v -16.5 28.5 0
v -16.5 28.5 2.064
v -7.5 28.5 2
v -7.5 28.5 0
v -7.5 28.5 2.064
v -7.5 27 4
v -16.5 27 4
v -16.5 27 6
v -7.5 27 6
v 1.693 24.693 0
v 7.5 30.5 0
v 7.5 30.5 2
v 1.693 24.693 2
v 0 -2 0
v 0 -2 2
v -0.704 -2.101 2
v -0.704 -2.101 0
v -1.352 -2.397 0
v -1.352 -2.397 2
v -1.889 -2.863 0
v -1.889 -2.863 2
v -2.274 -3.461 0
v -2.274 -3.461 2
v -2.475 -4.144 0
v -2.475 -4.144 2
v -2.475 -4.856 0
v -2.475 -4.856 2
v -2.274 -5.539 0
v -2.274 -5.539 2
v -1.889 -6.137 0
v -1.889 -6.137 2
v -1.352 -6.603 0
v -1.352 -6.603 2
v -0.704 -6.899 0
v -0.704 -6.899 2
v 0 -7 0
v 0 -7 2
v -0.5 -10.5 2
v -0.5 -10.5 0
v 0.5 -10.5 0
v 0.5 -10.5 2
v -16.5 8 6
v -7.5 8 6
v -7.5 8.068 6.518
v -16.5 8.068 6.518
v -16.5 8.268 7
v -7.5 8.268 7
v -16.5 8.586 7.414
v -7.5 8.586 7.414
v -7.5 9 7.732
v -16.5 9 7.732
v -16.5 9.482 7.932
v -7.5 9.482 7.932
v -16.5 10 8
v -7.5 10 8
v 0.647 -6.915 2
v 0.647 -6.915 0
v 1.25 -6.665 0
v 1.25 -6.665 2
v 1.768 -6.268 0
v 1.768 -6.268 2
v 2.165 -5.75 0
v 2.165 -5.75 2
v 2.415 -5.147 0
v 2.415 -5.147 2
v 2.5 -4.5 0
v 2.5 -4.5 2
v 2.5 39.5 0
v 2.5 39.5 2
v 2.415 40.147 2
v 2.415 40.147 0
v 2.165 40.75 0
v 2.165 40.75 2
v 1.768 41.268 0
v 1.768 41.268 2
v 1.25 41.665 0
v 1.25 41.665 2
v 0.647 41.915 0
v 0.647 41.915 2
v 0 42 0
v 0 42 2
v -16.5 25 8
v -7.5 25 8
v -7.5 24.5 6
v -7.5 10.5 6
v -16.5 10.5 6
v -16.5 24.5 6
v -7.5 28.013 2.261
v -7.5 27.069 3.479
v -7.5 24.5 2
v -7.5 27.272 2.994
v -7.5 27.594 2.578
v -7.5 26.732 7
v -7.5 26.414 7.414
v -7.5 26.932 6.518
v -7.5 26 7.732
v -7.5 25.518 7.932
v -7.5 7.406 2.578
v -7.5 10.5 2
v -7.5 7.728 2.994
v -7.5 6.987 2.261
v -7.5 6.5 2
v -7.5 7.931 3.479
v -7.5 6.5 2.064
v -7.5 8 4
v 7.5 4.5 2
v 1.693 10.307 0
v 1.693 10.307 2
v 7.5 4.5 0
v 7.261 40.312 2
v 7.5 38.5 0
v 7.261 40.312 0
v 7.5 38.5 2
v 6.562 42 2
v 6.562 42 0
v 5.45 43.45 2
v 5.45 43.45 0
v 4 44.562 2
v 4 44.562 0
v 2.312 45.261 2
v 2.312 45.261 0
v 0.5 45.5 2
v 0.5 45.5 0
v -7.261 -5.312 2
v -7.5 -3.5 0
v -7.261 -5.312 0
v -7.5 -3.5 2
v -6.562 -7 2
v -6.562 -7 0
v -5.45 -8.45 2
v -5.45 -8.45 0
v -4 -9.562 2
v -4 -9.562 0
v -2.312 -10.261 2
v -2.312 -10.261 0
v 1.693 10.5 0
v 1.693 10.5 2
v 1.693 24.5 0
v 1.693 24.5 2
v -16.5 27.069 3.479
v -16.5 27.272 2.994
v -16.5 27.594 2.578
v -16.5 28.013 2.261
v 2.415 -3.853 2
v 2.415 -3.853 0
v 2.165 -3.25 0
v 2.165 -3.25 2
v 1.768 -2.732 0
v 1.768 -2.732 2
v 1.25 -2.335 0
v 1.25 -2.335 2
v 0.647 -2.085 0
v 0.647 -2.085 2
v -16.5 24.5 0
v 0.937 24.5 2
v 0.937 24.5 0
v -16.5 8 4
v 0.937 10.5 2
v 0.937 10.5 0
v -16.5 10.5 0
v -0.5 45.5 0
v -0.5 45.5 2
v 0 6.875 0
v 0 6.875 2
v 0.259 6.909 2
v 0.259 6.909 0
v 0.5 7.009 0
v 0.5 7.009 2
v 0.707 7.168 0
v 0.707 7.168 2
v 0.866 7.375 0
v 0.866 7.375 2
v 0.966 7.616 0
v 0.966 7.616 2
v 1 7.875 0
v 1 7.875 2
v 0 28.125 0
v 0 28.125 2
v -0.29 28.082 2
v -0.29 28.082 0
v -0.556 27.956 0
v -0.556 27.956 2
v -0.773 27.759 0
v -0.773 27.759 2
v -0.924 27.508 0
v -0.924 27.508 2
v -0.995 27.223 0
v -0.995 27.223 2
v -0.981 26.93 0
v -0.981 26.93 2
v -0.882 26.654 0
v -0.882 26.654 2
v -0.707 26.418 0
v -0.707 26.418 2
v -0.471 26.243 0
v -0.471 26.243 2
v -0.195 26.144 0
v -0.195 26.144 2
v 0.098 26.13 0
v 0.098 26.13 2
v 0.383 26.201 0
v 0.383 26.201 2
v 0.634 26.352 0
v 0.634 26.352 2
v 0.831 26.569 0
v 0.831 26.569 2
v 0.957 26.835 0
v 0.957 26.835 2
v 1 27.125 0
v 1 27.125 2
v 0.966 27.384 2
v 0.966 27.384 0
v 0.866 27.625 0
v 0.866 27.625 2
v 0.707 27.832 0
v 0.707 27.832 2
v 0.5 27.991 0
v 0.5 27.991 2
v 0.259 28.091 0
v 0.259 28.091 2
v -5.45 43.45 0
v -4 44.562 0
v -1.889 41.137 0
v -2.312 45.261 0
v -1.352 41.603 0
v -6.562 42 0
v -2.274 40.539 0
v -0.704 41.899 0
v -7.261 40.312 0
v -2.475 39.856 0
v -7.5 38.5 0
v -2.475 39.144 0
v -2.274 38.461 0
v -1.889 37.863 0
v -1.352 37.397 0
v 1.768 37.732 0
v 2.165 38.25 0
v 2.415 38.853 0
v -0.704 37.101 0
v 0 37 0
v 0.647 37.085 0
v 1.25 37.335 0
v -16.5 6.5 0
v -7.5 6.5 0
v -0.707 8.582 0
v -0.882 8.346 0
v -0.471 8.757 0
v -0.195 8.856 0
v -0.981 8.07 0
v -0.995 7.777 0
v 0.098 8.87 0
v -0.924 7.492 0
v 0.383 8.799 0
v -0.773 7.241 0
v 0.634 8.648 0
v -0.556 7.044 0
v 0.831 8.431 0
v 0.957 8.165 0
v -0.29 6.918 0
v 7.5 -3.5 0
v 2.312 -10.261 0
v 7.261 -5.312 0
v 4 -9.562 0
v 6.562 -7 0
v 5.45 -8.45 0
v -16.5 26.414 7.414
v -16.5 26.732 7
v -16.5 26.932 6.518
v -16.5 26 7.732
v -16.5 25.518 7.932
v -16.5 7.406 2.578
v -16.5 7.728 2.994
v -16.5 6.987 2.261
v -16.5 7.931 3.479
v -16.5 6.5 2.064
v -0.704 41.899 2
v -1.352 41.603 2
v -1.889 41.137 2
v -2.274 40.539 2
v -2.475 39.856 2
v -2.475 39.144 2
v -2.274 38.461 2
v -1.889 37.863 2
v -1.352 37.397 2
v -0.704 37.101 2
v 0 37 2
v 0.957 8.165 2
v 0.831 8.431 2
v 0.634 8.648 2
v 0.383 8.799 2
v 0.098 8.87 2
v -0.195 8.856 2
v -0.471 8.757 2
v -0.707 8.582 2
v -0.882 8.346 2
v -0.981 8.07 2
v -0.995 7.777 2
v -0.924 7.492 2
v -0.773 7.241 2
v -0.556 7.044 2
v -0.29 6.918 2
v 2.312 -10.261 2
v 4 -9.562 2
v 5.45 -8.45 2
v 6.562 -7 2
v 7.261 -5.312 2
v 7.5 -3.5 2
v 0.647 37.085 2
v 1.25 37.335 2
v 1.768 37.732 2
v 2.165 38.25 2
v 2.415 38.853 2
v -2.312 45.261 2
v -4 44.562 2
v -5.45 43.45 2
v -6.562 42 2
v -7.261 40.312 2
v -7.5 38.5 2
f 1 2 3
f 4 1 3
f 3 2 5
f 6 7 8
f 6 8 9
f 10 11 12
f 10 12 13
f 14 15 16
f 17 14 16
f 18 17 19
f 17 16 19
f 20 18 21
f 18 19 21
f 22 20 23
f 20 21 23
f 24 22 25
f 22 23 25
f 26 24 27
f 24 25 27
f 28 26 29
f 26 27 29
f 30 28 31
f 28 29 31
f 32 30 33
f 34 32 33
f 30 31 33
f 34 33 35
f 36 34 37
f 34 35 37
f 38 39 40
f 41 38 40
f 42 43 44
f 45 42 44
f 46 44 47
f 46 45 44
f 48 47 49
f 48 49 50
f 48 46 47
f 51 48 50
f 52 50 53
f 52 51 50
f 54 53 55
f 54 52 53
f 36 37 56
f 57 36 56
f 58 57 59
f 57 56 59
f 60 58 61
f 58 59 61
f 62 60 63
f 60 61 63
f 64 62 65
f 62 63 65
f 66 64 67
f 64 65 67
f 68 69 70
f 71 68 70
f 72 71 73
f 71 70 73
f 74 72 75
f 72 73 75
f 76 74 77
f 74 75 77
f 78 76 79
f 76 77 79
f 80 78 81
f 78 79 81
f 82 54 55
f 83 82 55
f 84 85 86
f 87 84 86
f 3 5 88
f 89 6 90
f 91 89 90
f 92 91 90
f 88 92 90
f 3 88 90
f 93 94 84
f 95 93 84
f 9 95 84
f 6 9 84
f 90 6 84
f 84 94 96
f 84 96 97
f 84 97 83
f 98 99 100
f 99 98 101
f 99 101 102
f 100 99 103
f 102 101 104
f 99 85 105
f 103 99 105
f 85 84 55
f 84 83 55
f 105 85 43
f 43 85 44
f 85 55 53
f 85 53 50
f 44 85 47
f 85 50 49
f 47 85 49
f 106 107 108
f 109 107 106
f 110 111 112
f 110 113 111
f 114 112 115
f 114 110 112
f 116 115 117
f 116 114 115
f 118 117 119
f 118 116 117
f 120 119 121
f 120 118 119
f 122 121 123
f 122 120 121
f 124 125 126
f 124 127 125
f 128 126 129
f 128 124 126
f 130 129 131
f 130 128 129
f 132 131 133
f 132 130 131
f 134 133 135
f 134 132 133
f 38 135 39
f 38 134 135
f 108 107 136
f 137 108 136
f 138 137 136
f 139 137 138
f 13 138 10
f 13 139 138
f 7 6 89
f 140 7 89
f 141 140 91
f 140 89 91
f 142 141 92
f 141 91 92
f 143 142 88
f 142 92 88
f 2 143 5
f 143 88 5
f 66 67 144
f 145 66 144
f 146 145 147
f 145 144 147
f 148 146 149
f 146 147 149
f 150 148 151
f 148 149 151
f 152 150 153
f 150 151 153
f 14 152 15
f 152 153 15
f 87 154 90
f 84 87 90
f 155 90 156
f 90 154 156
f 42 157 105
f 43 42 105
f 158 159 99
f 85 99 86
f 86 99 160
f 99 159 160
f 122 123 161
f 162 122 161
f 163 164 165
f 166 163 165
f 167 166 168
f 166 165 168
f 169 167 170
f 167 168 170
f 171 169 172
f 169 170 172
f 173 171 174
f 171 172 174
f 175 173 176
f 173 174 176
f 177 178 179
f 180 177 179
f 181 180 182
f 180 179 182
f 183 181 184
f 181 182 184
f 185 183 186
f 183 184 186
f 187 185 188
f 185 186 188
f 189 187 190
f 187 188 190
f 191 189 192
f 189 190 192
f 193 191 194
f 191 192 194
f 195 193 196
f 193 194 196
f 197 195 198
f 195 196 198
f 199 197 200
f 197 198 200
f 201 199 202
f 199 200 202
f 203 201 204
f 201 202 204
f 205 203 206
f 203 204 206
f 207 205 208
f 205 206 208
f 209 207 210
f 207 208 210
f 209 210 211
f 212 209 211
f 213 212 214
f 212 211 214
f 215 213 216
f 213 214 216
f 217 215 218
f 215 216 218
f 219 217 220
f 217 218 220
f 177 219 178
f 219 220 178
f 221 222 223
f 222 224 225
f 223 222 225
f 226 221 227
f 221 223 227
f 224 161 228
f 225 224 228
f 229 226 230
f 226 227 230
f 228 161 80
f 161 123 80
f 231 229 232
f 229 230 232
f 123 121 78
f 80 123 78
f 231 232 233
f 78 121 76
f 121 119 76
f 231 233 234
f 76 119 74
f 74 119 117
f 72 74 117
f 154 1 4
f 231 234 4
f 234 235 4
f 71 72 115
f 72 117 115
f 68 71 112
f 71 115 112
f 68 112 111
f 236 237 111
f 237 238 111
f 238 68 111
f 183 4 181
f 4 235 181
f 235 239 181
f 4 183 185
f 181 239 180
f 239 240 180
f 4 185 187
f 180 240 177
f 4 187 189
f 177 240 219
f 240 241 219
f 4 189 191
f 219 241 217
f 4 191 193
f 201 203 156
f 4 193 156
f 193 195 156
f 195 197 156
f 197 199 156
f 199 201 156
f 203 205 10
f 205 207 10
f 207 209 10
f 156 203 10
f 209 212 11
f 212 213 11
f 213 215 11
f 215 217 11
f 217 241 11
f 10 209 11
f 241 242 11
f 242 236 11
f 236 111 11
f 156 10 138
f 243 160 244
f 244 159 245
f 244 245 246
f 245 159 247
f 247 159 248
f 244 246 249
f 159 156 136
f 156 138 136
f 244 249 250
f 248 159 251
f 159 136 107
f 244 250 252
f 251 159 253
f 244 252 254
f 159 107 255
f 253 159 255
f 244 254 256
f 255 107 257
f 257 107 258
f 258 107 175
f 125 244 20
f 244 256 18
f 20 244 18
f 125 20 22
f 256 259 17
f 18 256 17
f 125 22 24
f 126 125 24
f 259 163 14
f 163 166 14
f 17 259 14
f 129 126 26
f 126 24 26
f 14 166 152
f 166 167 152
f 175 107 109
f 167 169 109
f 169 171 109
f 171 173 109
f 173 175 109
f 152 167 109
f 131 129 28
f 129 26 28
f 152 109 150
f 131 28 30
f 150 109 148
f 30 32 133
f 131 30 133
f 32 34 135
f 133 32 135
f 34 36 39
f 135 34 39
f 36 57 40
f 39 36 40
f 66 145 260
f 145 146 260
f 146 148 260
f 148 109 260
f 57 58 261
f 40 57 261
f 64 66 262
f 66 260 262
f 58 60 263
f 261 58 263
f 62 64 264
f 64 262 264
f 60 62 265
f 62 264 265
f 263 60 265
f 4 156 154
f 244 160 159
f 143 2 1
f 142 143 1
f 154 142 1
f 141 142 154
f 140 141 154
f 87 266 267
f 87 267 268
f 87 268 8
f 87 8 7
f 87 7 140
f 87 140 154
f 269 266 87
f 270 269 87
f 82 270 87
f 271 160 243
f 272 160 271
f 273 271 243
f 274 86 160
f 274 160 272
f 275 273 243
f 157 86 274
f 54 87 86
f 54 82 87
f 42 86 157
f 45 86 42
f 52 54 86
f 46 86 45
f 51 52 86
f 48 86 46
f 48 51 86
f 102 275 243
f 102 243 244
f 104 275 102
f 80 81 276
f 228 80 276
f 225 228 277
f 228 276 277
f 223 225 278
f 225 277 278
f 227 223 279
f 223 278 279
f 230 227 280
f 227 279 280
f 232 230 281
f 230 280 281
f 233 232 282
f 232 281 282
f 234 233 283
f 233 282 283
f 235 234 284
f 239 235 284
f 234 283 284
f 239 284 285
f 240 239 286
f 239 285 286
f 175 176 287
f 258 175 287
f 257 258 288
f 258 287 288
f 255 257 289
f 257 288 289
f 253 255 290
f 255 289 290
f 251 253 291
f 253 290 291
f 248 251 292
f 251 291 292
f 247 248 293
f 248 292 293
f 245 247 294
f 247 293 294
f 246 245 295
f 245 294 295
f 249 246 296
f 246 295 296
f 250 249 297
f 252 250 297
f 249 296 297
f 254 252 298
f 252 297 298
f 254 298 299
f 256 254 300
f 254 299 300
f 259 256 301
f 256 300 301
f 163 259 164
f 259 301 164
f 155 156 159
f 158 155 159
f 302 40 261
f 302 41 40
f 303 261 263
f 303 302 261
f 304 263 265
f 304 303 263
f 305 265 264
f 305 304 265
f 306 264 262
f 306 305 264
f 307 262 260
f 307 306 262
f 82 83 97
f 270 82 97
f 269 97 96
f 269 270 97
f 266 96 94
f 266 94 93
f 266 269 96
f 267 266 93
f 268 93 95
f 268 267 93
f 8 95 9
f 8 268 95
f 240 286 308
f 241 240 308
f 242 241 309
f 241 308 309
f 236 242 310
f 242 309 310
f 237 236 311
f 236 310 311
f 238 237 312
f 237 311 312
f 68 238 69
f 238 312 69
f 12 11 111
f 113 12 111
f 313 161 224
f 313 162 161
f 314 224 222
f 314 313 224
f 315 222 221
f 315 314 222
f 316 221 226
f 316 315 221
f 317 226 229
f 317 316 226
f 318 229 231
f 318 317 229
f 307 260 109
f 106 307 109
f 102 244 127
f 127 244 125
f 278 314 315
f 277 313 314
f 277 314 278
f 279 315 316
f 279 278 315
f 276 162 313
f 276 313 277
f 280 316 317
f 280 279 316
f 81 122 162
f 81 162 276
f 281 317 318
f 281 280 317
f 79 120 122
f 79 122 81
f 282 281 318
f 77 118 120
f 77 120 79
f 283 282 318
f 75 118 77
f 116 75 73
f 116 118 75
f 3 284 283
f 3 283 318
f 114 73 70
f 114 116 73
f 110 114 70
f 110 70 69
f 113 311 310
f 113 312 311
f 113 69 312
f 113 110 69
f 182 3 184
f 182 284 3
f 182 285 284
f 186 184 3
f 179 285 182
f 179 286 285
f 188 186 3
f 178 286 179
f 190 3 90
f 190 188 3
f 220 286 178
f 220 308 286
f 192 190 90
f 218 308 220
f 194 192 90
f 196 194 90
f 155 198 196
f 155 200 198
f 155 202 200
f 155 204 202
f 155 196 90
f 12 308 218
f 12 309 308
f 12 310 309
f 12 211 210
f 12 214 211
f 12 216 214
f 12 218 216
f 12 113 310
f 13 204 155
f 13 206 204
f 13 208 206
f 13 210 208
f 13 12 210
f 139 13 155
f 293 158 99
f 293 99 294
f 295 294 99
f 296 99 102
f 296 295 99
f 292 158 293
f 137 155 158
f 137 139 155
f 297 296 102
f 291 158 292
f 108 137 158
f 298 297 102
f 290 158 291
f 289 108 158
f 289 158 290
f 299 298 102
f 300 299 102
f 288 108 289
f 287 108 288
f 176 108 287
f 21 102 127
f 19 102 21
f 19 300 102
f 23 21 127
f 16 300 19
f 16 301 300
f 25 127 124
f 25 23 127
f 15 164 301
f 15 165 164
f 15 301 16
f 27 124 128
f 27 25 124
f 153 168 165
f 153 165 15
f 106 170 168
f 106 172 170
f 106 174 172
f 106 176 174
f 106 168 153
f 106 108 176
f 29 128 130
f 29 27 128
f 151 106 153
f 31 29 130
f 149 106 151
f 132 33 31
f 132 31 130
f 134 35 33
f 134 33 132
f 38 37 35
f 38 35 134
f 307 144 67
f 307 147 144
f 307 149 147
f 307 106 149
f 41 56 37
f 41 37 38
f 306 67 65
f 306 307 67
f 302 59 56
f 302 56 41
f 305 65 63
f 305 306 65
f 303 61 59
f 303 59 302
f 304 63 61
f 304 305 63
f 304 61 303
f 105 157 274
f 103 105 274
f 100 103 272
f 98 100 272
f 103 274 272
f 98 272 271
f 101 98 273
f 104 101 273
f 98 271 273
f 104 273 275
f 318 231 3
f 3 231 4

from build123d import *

# Parameters (mm, degrees)
F0_W          = 0.7558596553
F0_H          = 7
F1_DEPTH      = 2
F2_R          = 7
F4_DEPTH      = 2
F5_W          = 4
F5_H          = 2
F6_DEPTH      = 9
F8_DEPTH      = 6
F9_W          = 9
F9_H          = 2
F10_DEPTH     = 14
F11_W         = 4
F11_H         = 2
F12_DEPTH     = 9
F13_W         = 9
F13_H         = 2.5
F14_DEPTH     = 6
F15_T4_DEPTH  = 32.8601958556
F15_T9_DEPTH  = 32.8601958556
F16_T4_DEPTH  = 9
F16_T9_DEPTH  = 9
F16_T11_DEPTH = 19


# Not quite as in the source:
# - a fillet or chamfer that OpenCascade refuses, or shapes differently, is made with other operations: its cross-section is extruded or revolved along the edge and cut away or added
# - a feature names something its author has since deleted; it is built from what else it names


with BuildPart() as f1:
    # F0 (on Top) → F1 (new body)
    with BuildSketch(Plane.XY):
        Polygon((-2.7234070003, 10.5), (-7.5, 10.5), (-7.5, -10.5), (7.5, -10.5), (7.5, 10.5), (1.692557591, 10.5), (0.9366979357, 10.5), (-1.7226199852, 10.5), (-2.5201837998, 10.5), align=None)
        with Locations((1.3146277633, 14)):
            Rectangle(F0_W, F0_H)
        with Locations((1.3146277633, 21)):
            Rectangle(F0_W, F0_H)
        Polygon((-1.7226199852, 24.5), (0.9366979357, 24.5), (1.692557591, 24.5), (7.5, 24.5), (7.5, 45.5), (-7.5, 45.5), (-7.5, 24.5), (-2.7234070003, 24.5), (-2.5201837998, 24.5), align=None)
    extrude(amount=F1_DEPTH)

    # F2
    f2_edges = [f1.edges().sort_by_distance(p)[0] for p in [
        (-7.5, -10.5, 1),
        (7.5, -10.5, 1),
        (7.5, 45.5, 1),
        (-7.5, 45.5, 1),
    ]]
    fillet(f2_edges, radius=F2_R)

    # F3 (on face) → F4 (cut, through all)
    with BuildSketch(Plane.XY.offset(2)):
        with BuildLine():
            ThreePointArc((0, -7), (1.767766953, -6.267766953), (2.5, -4.5))
            ThreePointArc((2.5, -4.5), (1.767766953, -2.732233047), (0, -2))
            Line((0, -2), (0, -4.5))
            Line((0, -4.5), (0, -7))
        make_face()
        with BuildLine():
            ThreePointArc((1, 7.875), (-0.7071067812, 8.5821067812), (0, 6.875))
            ThreePointArc((0, 6.875), (0.7071067812, 7.1678932188), (1, 7.875))
        make_face()
        with BuildLine():
            Line((0, -4.5), (0, -2))
            ThreePointArc((0, -2), (-2.5, -4.5), (0, -7))
            Line((0, -7), (0, -4.5))
        make_face()
        with BuildLine():
            ThreePointArc((2.5, 39.5), (1.767766953, 41.267766953), (0, 42))
            Line((0, 42), (0, 39.5))
            Line((0, 39.5), (0, 37))
            ThreePointArc((0, 37), (1.767766953, 37.732233047), (2.5, 39.5))
        make_face()
        with BuildLine():
            ThreePointArc((1, 27.125), (0.7071067812, 27.8321067812), (0, 28.125))
            ThreePointArc((0, 28.125), (-0.7071067812, 26.4178932188), (1, 27.125))
        make_face()
        with BuildLine():
            Line((0, 39.5), (0, 42))
            ThreePointArc((0, 42), (-2.5, 39.5), (0, 37))
            Line((0, 37), (0, 39.5))
        make_face()
    extrude(amount=-F4_DEPTH, mode=Mode.SUBTRACT)

    # F5 (on face) → F6 (join)
    with BuildSketch(Plane(origin=(-7.5, 0, 0), x_dir=(0, -1, 0), z_dir=(-1, 0, 0))):
        with Locations((-8.5, 1)):
            Rectangle(F5_W, F5_H)
    extrude(amount=F6_DEPTH)

    # F7 (on face) → F8 (join)
    with BuildSketch(Plane.XY.offset(2)):
        Polygon((-8.0660292879, 10.5), (-16.5, 10.5), (-16.5, 8), (-7.5, 8), (-7.5, 10.5), align=None)
    extrude(amount=F8_DEPTH)

    # F9 (on face) → F10 (join)
    with BuildSketch(Plane(origin=(0, 10.5, 0), x_dir=(-1, 0, 0), z_dir=(0, 1, 0))):
        with Locations((12, 7)):
            Rectangle(F9_W, F9_H)
    extrude(amount=F10_DEPTH)

    # F11 (on face) → F12 (join)
    with BuildSketch(Plane(origin=(-7.5, 0, 0), x_dir=(0, -1, 0), z_dir=(-1, 0, 0))):
        with Locations((-26.5, 1)):
            Rectangle(F11_W, F11_H)
    extrude(amount=F12_DEPTH)

    # F13 (on face) → F14 (join)
    with BuildSketch(Plane.XY.offset(2)):
        with Locations((-12, 25.75)):
            Rectangle(F13_W, F13_H)
    extrude(amount=F14_DEPTH)

    # F15: chamfer of 6 on 2 edges, made by hand


with BuildPart() as f15_tool2:
    # F15_s3 → F15_t4 (new body)
    with BuildSketch(Plane.XY.offset(-15.4300979278)):
        Polygon((1.5, 10.5), (7.5, 4.5), (7.5, 10.5), align=None)
    extrude(amount=F15_T4_DEPTH)

    split(bisect_by=Plane.YZ.offset(1.692557591), keep=Keep.TOP)


with BuildPart() as f1_1:
    add(f1.part)

    # F15_t1: cut F15_tool2
    add(f15_tool2.part, mode=Mode.SUBTRACT)


with BuildPart() as f15_tool7:
    # F15_s8 → F15_t9 (new body)
    with BuildSketch(Plane.XY.offset(-15.4300979278)):
        Polygon((7.5, 30.5), (1.5, 24.5), (7.5, 24.5), align=None)
    extrude(amount=F15_T9_DEPTH)

    split(bisect_by=Plane.YZ.offset(1.692557591), keep=Keep.TOP)


with BuildPart() as f1_2:
    add(f1_1.part)

    # F15_t6: cut F15_tool7
    add(f15_tool7.part, mode=Mode.SUBTRACT)

    # F16: fillet of radius 2 on 4 edges, made by hand


with BuildPart() as f16_tool2:
    # F16_s3 → F16_t4 (new body)
    with BuildSketch(Plane.YZ.offset(-16.5)):
        with BuildLine():
            ThreePointArc((8, 4), (7.4142135624, 2.5857864376), (6, 2))
            Line((6, 2), (8, 2))
            Line((8, 2), (8, 4))
        make_face()
    extrude(amount=F16_T4_DEPTH)

    split(bisect_by=Plane.XZ.offset(-6.5), keep=Keep.BOTTOM)


with BuildPart() as f1_3:
    add(f1_2.part)

    # F16_t1: union F16_tool2
    add(f16_tool2.part)


with BuildPart() as f16_tool7:
    # F16_s8 → F16_t9 (new body)
    with BuildSketch(Plane.YZ.offset(-7.5)):
        with BuildLine():
            ThreePointArc((27, 4), (27.5857864376, 2.5857864376), (29, 2))
            Line((29, 2), (27, 2))
            Line((27, 2), (27, 4))
        make_face()
    extrude(amount=-F16_T9_DEPTH)

    split(bisect_by=Plane.XZ.offset(-28.5), keep=Keep.TOP)


with BuildPart() as f1_4:
    add(f1_3.part)

    # F16_t6: union F16_tool7
    add(f16_tool7.part)

    # F16_s12 → F16_t11 (cut)
    with BuildSketch(Plane.YZ.offset(-21.5)):
        with BuildLine():
            ThreePointArc((8, 6), (8.5857864376, 7.4142135624), (10, 8))
            Line((10, 8), (8, 8))
            Line((8, 8), (8, 6))
        make_face()
        with BuildLine():
            ThreePointArc((25, 8), (26.4142135624, 7.4142135624), (27, 6))
            Line((27, 6), (27, 8))
            Line((27, 8), (25, 8))
        make_face()
    extrude(amount=F16_T11_DEPTH, mode=Mode.SUBTRACT)


solid = f1_4.part
